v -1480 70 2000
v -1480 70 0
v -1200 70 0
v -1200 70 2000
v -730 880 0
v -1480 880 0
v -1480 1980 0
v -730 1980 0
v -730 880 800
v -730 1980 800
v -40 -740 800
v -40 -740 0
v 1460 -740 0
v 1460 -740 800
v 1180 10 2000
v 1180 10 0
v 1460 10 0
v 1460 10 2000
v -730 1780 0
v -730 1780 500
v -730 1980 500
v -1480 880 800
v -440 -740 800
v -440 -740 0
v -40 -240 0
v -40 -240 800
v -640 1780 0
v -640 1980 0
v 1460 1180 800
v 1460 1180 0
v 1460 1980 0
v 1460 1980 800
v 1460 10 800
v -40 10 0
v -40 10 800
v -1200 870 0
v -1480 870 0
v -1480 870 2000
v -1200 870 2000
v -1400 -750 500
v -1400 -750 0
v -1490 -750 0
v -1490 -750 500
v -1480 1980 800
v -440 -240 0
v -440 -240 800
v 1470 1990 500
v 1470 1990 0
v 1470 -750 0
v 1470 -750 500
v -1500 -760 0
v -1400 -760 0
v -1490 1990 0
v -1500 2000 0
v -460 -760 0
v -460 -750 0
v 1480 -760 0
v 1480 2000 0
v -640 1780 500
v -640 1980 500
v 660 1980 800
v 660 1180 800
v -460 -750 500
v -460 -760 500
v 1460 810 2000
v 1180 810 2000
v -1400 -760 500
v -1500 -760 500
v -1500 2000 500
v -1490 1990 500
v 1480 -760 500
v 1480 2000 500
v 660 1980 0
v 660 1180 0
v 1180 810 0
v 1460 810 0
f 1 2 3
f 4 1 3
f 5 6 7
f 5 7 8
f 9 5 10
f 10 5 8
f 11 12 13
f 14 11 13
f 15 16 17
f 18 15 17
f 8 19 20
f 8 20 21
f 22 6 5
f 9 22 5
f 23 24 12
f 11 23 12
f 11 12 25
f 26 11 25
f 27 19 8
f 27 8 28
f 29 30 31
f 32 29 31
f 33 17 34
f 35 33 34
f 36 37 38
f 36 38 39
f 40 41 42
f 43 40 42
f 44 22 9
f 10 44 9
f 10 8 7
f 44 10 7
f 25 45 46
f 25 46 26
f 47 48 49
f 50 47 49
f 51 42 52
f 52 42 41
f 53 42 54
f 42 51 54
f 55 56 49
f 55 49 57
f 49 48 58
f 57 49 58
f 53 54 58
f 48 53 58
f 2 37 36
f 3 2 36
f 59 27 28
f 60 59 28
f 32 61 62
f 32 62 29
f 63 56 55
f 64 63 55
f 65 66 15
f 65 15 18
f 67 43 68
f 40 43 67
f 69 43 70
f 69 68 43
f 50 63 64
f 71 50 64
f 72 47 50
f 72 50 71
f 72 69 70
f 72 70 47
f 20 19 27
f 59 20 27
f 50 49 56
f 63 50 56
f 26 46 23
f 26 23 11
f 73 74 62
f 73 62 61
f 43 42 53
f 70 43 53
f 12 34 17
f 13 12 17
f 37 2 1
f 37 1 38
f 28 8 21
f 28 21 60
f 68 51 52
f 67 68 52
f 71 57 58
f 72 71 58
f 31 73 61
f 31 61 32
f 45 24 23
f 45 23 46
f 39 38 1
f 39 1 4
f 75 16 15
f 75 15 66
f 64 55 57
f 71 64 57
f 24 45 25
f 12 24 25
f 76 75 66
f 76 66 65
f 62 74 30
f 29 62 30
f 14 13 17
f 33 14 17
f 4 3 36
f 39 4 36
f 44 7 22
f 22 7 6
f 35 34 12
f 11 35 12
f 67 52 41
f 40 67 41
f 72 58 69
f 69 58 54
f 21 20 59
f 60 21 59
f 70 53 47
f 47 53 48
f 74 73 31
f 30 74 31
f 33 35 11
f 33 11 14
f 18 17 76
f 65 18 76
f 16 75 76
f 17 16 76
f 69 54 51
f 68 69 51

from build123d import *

# Parameters (mm, degrees)
F1_DEPTH = 500
F0_W     = 280
F0_H     = 800
F2_DEPTH = 2000
F0_W_2   = 90
F0_H_2   = 200
F3_DEPTH = 500
F0_W_3   = 670
F4_DEPTH = 800
F5_DEPTH = 800
F6_DEPTH = 2000
F0_W_4   = 800
F7_DEPTH = 800
F0_W_5   = 400
F0_H_3   = 500
F8_DEPTH = 800


with BuildPart() as f1:
    # F0 (on Top) → F1 (new body)
    with BuildSketch(Plane.XY):
        Polygon((-1490, -750), (-1490, 1990), (1470, 1990), (1470, -750), (-460, -750), (-460, -760), (1480, -760), (1480, 2000), (-1500, 2000), (-1500, -760), (-1400, -760), (-1400, -750), align=None)
    extrude(amount=F1_DEPTH)


with BuildPart() as f2:
    # F0 (on Top) → F2 (new body)
    with BuildSketch(Plane.XY):
        with Locations((-1340, 470)):
            Rectangle(F0_W, F0_H)
    extrude(amount=F2_DEPTH)


with BuildPart() as f3:
    # F0 (on Top) → F3 (new body)
    with BuildSketch(Plane.XY):
        with Locations((-685, 1880)):
            Rectangle(F0_W_2, F0_H_2)
    extrude(amount=F3_DEPTH)


with BuildPart() as f4:
    # F0 (on Top) → F4 (new body)
    with BuildSketch(Plane.XY):
        with Locations((-1065, 1880)):
            Rectangle(F0_W_3, F0_H_2)
        Polygon((-1400, 1780), (-1400, 1980), (-1480, 1980), (-1480, 880), (-730, 880), (-730, 1780), align=None)
    extrude(amount=F4_DEPTH)


with BuildPart() as f5:
    # F0 (on Top) → F5 (new body)
    with BuildSketch(Plane.XY):
        Polygon((1460, 10), (1180, 10), (-40, 10), (-40, -240), (-40, -740), (1460, -740), align=None)
    extrude(amount=F5_DEPTH)


with BuildPart() as f6:
    # F0 (on Top) → F6 (new body)
    with BuildSketch(Plane.XY):
        with Locations((1320, 410)):
            Rectangle(F0_W, F0_H)
    extrude(amount=F6_DEPTH)


with BuildPart() as f7:
    # F0 (on Top) → F7 (new body)
    with BuildSketch(Plane.XY):
        with Locations((1060, 1580)):
            Rectangle(F0_W_4, F0_H)
    extrude(amount=F7_DEPTH)


with BuildPart() as f8:
    # F0 (on Top) → F8 (new body)
    with BuildSketch(Plane.XY):
        with Locations((-240, -490)):
            Rectangle(F0_W_5, F0_H_3)
    extrude(amount=F8_DEPTH)


solid = Compound([f1.part, f2.part, f3.part, f4.part, f5.part, f6.part, f7.part, f8.part])
